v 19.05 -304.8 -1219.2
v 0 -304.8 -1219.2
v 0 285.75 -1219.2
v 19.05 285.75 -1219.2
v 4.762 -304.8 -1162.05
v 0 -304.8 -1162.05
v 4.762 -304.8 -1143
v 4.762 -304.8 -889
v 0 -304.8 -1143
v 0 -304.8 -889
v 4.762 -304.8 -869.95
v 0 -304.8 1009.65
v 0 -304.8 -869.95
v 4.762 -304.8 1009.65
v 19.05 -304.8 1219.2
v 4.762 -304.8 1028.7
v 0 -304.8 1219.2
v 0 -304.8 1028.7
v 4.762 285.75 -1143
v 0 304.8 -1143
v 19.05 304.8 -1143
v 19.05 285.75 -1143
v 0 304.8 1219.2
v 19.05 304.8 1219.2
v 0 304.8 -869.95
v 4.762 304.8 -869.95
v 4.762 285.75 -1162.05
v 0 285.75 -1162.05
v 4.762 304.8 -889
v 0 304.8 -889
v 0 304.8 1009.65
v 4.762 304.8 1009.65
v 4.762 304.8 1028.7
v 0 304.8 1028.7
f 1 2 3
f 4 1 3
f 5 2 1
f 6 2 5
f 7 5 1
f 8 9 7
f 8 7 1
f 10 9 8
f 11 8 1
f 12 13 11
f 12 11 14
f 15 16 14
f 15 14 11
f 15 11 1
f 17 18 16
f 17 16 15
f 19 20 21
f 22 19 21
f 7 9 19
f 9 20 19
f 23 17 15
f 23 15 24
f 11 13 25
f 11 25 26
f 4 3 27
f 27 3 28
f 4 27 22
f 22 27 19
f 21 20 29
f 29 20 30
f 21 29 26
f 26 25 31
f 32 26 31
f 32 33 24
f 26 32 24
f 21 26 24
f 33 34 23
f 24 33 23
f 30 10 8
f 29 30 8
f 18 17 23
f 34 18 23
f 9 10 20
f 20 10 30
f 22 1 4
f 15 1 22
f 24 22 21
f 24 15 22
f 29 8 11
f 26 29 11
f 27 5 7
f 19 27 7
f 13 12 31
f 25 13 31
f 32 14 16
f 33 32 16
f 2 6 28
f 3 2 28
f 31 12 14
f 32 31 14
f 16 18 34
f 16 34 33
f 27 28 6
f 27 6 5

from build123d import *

# Parameters (mm, degrees)
F0_W     = 609.6
F0_H     = 2438.4
F1_DEPTH = 19.05
F2_W     = 19.05
F2_H     = 76.2
F3_DEPTH = 25.4
F4_W     = 4.7625
F4_H     = 19.05
F5_DEPTH = 609.601


with BuildPart() as f1:
    # F0 (on Right) → F1 (new body)
    with BuildSketch(Plane.YZ):
        Rectangle(F0_W, F0_H)
    extrude(amount=F1_DEPTH)

    # F2 (on face) → F3 (cut)
    with BuildSketch(Plane(origin=(0, 0, 0), x_dir=(0, -1, 0), z_dir=(-1, 0, 0))):
        with Locations((-295.275, -1181.1)):
            Rectangle(F2_W, F2_H)
    extrude(amount=-F3_DEPTH, mode=Mode.SUBTRACT)

    # F4 (on face) → F5 (cut, through all)
    with BuildSketch(Plane.XZ.offset(304.8)):
        with Locations((2.38125, -1152.525)):
            Rectangle(F4_W, F4_H)
        with Locations((2.38125, -879.475)):
            Rectangle(F4_W, F4_H)
        with Locations((2.38125, 1019.175)):
            Rectangle(F4_W, F4_H)
    extrude(amount=-F5_DEPTH, mode=Mode.SUBTRACT)


solid = f1.part
